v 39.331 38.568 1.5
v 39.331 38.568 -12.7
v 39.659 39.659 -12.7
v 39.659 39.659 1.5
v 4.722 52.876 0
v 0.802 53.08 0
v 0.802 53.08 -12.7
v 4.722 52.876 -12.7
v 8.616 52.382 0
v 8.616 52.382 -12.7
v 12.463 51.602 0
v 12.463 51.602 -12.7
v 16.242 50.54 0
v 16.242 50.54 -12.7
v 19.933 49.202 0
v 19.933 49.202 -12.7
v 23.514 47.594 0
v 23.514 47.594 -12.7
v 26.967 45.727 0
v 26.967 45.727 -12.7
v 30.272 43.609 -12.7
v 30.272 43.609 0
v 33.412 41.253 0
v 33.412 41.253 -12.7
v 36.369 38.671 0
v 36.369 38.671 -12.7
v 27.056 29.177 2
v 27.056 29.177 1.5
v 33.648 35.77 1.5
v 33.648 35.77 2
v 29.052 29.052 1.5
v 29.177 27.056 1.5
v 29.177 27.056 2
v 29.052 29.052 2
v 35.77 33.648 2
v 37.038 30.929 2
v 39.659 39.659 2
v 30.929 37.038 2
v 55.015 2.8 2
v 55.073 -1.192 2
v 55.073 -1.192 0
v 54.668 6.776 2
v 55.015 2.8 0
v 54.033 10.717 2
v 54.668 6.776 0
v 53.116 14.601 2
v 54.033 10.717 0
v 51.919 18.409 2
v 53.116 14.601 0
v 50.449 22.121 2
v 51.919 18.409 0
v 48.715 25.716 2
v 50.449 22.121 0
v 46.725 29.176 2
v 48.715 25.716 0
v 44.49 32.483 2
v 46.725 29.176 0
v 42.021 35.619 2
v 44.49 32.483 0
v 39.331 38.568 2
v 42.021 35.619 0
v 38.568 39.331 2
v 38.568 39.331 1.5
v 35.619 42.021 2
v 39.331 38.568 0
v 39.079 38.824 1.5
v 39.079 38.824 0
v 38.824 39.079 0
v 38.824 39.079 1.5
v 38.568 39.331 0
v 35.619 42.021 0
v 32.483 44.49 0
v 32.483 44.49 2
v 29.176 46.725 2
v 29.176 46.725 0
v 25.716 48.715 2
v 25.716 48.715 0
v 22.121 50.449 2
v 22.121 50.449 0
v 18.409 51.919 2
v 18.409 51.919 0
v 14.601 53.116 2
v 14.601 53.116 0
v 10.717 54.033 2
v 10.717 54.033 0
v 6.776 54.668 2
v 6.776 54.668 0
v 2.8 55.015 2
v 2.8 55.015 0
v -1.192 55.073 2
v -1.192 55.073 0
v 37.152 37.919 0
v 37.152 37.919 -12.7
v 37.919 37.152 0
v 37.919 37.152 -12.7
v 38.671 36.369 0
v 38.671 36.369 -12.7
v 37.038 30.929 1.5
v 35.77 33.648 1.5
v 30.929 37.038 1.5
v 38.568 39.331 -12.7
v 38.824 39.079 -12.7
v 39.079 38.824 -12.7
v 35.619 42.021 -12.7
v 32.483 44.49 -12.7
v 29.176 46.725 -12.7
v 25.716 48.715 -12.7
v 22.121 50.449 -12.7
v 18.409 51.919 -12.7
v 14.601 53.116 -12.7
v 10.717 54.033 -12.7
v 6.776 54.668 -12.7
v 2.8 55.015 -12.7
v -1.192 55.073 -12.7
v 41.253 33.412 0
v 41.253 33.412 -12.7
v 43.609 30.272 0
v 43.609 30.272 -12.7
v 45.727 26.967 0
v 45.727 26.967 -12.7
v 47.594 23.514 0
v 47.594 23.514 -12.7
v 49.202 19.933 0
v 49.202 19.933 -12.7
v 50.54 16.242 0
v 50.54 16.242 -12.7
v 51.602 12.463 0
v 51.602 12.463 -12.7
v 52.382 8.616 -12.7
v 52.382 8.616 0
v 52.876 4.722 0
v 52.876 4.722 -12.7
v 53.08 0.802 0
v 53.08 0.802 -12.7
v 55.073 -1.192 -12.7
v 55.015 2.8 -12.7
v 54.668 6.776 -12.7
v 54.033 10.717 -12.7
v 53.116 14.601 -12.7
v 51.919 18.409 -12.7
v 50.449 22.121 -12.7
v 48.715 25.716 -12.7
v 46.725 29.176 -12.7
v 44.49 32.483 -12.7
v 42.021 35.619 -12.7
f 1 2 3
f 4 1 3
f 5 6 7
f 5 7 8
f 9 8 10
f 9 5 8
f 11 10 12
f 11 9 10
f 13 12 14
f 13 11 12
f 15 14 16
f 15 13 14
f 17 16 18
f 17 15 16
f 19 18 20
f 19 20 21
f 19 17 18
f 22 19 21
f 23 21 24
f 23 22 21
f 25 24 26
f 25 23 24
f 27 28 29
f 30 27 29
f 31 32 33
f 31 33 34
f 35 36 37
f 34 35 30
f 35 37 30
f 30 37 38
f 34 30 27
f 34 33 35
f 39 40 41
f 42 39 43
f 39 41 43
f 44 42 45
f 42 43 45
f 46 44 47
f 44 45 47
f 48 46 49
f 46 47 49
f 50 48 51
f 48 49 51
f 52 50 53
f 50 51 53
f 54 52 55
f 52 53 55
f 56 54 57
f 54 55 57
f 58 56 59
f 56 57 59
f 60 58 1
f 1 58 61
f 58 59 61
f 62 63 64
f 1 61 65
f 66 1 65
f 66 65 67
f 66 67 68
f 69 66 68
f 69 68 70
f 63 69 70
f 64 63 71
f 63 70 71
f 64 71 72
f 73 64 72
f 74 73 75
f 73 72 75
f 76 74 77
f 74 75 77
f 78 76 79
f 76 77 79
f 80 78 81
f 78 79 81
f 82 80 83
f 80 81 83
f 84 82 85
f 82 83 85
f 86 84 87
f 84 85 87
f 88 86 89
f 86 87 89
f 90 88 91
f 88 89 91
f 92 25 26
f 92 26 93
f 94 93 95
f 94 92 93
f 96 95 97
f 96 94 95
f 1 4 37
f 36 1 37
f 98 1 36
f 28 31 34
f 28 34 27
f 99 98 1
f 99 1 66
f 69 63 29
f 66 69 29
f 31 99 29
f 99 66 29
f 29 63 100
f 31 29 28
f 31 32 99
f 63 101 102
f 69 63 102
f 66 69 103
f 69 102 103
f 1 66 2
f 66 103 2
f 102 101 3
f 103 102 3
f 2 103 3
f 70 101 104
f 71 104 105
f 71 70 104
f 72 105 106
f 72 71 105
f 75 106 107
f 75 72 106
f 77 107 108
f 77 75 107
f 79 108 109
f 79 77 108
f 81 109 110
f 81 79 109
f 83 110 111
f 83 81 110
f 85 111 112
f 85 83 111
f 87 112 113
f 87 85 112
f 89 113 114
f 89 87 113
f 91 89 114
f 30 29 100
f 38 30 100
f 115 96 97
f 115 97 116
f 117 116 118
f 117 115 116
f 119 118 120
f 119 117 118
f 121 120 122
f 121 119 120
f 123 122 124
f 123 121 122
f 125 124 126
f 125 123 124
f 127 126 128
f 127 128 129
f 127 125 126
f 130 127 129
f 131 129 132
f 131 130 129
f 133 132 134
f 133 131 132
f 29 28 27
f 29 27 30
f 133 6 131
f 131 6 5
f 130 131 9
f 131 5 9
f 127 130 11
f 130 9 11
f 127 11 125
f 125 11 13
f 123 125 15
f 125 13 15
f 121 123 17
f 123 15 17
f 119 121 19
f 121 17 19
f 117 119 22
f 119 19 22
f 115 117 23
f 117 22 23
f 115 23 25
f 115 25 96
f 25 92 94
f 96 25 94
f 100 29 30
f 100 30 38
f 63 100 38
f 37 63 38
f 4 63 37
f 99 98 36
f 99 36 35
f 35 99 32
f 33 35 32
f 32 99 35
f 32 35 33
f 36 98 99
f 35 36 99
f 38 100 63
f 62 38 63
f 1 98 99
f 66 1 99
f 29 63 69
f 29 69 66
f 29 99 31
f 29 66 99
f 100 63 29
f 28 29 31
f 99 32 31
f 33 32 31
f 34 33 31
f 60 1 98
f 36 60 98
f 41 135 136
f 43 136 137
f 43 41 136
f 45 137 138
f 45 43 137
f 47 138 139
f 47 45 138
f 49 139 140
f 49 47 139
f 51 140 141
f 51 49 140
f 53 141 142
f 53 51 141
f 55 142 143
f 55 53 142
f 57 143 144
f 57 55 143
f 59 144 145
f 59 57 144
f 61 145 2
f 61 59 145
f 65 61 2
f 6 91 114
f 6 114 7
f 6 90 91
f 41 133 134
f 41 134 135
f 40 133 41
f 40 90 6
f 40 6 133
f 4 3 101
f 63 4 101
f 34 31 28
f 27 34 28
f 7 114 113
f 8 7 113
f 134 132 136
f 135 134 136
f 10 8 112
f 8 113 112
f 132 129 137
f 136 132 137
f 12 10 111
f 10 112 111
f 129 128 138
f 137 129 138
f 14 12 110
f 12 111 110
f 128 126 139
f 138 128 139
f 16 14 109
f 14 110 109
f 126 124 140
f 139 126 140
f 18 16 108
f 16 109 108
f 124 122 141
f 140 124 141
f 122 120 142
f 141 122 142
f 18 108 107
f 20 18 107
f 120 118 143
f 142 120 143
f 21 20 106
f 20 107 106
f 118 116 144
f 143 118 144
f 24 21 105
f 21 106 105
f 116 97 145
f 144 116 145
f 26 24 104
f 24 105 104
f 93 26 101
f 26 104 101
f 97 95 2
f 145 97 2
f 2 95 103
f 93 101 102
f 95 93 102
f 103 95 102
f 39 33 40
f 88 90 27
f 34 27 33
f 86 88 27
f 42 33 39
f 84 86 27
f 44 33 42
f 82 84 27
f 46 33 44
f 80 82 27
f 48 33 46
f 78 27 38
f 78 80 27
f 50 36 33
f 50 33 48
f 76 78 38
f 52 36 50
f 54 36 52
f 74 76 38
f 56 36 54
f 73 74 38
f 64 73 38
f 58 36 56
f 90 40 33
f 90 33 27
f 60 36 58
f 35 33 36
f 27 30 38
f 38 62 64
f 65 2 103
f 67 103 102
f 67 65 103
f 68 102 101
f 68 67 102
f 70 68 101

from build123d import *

# Parameters (mm, degrees)
FACE_2_DEPTH           = 2
CURVED_ALIGNMENT_DEPTH = 12.7
ARROW_CUT_START        = 1.5
ARROW_CUT_DEPTH        = 0.5
ARROW_EXTRUDE_START    = 1.5
ARROW_EXTRUDE_DEPTH    = 0.5
ARROW_TIP_START        = -12.7
ARROW_TIP_DEPTH        = 14.2


with BuildPart() as part:
    # main_features_sketch → face 2 (new body)
    with BuildSketch(Plane.XY):
        with BuildLine():
            Line((-1.191574198, 55.073110925), (55.073110925, -1.191574198))
            ThreePointArc((55.073110925, -1.191574198), (38.951684148, 38.951684148), (-1.191574198, 55.073110925))
        make_face()
    extrude(amount=FACE_2_DEPTH)

    # Sketch1<3> → curved_alignment (add)
    with BuildSketch(Plane.XY):
        with BuildLine():
            Line((-1.191574198, 55.073110925), (0.801588996, 53.079947731))
            ThreePointArc((0.801588996, 53.079947731), (19.932744129, 49.201718542), (36.368769629, 38.67086748))
            Line((36.368769629, 38.67086748), (38.568293544, 39.331337749))
            ThreePointArc((38.568293544, 39.331337749), (20.278206107, 51.217787467), (-1.191574198, 55.073110925))
        make_face()
        with BuildLine():
            Line((38.568293544, 39.331337749), (36.368769629, 38.67086748))
            ThreePointArc((36.368769629, 38.67086748), (37.537470586, 37.537470586), (38.67086748, 36.368769629))
            Line((38.67086748, 36.368769629), (39.331337749, 38.568293544))
            ThreePointArc((39.331337749, 38.568293544), (38.951684148, 38.951684148), (38.568293544, 39.331337749))
        make_face()
        with BuildLine():
            ThreePointArc((38.67086748, 36.368769629), (49.201718542, 19.932744129), (53.079947731, 0.801588996))
            Line((53.079947731, 0.801588996), (55.073110925, -1.191574198))
            ThreePointArc((55.073110925, -1.191574198), (51.217787467, 20.278206107), (39.331337749, 38.568293544))
            Line((39.331337749, 38.568293544), (38.67086748, 36.368769629))
        make_face()
    extrude(amount=-CURVED_ALIGNMENT_DEPTH)

    # Sketch1<4> → arrow_cut (cut)
    with BuildSketch(Plane.XY.offset(ARROW_CUT_START)):
        Polygon((27.056114693, 29.177435037), (33.64838329, 35.769703633), (30.929459928, 37.037558418), (39.65879093, 39.65879093), (37.037558418, 30.929459928), (35.769703633, 33.64838329), (29.177435037, 27.056114693), (29.052189212, 29.052189212), align=None)
    extrude(amount=ARROW_CUT_DEPTH, mode=Mode.SUBTRACT)


with BuildPart() as body_2:
    # Sketch1<5> → arrow_extrude (new body)
    with BuildSketch(Plane.XY.offset(ARROW_EXTRUDE_START)):
        Polygon((27.056114693, 29.177435037), (33.64838329, 35.769703633), (30.929459928, 37.037558418), (39.65879093, 39.65879093), (37.037558418, 30.929459928), (35.769703633, 33.64838329), (29.177435037, 27.056114693), (29.052189212, 29.052189212), align=None)
    extrude(amount=ARROW_EXTRUDE_DEPTH)

    # main_features_sketch<6> → arrow_tip (add)
    with BuildSketch(Plane.XY.offset(ARROW_TIP_START)):
        with BuildLine():
            Line((39.65879093, 39.65879093), (38.568293544, 39.331337749))
            ThreePointArc((38.568293544, 39.331337749), (38.951684148, 38.951684148), (39.331337749, 38.568293544))
            Line((39.331337749, 38.568293544), (39.65879093, 39.65879093))
        make_face()
    extrude(amount=ARROW_TIP_DEPTH)


solid = Compound([part.part, body_2.part])
